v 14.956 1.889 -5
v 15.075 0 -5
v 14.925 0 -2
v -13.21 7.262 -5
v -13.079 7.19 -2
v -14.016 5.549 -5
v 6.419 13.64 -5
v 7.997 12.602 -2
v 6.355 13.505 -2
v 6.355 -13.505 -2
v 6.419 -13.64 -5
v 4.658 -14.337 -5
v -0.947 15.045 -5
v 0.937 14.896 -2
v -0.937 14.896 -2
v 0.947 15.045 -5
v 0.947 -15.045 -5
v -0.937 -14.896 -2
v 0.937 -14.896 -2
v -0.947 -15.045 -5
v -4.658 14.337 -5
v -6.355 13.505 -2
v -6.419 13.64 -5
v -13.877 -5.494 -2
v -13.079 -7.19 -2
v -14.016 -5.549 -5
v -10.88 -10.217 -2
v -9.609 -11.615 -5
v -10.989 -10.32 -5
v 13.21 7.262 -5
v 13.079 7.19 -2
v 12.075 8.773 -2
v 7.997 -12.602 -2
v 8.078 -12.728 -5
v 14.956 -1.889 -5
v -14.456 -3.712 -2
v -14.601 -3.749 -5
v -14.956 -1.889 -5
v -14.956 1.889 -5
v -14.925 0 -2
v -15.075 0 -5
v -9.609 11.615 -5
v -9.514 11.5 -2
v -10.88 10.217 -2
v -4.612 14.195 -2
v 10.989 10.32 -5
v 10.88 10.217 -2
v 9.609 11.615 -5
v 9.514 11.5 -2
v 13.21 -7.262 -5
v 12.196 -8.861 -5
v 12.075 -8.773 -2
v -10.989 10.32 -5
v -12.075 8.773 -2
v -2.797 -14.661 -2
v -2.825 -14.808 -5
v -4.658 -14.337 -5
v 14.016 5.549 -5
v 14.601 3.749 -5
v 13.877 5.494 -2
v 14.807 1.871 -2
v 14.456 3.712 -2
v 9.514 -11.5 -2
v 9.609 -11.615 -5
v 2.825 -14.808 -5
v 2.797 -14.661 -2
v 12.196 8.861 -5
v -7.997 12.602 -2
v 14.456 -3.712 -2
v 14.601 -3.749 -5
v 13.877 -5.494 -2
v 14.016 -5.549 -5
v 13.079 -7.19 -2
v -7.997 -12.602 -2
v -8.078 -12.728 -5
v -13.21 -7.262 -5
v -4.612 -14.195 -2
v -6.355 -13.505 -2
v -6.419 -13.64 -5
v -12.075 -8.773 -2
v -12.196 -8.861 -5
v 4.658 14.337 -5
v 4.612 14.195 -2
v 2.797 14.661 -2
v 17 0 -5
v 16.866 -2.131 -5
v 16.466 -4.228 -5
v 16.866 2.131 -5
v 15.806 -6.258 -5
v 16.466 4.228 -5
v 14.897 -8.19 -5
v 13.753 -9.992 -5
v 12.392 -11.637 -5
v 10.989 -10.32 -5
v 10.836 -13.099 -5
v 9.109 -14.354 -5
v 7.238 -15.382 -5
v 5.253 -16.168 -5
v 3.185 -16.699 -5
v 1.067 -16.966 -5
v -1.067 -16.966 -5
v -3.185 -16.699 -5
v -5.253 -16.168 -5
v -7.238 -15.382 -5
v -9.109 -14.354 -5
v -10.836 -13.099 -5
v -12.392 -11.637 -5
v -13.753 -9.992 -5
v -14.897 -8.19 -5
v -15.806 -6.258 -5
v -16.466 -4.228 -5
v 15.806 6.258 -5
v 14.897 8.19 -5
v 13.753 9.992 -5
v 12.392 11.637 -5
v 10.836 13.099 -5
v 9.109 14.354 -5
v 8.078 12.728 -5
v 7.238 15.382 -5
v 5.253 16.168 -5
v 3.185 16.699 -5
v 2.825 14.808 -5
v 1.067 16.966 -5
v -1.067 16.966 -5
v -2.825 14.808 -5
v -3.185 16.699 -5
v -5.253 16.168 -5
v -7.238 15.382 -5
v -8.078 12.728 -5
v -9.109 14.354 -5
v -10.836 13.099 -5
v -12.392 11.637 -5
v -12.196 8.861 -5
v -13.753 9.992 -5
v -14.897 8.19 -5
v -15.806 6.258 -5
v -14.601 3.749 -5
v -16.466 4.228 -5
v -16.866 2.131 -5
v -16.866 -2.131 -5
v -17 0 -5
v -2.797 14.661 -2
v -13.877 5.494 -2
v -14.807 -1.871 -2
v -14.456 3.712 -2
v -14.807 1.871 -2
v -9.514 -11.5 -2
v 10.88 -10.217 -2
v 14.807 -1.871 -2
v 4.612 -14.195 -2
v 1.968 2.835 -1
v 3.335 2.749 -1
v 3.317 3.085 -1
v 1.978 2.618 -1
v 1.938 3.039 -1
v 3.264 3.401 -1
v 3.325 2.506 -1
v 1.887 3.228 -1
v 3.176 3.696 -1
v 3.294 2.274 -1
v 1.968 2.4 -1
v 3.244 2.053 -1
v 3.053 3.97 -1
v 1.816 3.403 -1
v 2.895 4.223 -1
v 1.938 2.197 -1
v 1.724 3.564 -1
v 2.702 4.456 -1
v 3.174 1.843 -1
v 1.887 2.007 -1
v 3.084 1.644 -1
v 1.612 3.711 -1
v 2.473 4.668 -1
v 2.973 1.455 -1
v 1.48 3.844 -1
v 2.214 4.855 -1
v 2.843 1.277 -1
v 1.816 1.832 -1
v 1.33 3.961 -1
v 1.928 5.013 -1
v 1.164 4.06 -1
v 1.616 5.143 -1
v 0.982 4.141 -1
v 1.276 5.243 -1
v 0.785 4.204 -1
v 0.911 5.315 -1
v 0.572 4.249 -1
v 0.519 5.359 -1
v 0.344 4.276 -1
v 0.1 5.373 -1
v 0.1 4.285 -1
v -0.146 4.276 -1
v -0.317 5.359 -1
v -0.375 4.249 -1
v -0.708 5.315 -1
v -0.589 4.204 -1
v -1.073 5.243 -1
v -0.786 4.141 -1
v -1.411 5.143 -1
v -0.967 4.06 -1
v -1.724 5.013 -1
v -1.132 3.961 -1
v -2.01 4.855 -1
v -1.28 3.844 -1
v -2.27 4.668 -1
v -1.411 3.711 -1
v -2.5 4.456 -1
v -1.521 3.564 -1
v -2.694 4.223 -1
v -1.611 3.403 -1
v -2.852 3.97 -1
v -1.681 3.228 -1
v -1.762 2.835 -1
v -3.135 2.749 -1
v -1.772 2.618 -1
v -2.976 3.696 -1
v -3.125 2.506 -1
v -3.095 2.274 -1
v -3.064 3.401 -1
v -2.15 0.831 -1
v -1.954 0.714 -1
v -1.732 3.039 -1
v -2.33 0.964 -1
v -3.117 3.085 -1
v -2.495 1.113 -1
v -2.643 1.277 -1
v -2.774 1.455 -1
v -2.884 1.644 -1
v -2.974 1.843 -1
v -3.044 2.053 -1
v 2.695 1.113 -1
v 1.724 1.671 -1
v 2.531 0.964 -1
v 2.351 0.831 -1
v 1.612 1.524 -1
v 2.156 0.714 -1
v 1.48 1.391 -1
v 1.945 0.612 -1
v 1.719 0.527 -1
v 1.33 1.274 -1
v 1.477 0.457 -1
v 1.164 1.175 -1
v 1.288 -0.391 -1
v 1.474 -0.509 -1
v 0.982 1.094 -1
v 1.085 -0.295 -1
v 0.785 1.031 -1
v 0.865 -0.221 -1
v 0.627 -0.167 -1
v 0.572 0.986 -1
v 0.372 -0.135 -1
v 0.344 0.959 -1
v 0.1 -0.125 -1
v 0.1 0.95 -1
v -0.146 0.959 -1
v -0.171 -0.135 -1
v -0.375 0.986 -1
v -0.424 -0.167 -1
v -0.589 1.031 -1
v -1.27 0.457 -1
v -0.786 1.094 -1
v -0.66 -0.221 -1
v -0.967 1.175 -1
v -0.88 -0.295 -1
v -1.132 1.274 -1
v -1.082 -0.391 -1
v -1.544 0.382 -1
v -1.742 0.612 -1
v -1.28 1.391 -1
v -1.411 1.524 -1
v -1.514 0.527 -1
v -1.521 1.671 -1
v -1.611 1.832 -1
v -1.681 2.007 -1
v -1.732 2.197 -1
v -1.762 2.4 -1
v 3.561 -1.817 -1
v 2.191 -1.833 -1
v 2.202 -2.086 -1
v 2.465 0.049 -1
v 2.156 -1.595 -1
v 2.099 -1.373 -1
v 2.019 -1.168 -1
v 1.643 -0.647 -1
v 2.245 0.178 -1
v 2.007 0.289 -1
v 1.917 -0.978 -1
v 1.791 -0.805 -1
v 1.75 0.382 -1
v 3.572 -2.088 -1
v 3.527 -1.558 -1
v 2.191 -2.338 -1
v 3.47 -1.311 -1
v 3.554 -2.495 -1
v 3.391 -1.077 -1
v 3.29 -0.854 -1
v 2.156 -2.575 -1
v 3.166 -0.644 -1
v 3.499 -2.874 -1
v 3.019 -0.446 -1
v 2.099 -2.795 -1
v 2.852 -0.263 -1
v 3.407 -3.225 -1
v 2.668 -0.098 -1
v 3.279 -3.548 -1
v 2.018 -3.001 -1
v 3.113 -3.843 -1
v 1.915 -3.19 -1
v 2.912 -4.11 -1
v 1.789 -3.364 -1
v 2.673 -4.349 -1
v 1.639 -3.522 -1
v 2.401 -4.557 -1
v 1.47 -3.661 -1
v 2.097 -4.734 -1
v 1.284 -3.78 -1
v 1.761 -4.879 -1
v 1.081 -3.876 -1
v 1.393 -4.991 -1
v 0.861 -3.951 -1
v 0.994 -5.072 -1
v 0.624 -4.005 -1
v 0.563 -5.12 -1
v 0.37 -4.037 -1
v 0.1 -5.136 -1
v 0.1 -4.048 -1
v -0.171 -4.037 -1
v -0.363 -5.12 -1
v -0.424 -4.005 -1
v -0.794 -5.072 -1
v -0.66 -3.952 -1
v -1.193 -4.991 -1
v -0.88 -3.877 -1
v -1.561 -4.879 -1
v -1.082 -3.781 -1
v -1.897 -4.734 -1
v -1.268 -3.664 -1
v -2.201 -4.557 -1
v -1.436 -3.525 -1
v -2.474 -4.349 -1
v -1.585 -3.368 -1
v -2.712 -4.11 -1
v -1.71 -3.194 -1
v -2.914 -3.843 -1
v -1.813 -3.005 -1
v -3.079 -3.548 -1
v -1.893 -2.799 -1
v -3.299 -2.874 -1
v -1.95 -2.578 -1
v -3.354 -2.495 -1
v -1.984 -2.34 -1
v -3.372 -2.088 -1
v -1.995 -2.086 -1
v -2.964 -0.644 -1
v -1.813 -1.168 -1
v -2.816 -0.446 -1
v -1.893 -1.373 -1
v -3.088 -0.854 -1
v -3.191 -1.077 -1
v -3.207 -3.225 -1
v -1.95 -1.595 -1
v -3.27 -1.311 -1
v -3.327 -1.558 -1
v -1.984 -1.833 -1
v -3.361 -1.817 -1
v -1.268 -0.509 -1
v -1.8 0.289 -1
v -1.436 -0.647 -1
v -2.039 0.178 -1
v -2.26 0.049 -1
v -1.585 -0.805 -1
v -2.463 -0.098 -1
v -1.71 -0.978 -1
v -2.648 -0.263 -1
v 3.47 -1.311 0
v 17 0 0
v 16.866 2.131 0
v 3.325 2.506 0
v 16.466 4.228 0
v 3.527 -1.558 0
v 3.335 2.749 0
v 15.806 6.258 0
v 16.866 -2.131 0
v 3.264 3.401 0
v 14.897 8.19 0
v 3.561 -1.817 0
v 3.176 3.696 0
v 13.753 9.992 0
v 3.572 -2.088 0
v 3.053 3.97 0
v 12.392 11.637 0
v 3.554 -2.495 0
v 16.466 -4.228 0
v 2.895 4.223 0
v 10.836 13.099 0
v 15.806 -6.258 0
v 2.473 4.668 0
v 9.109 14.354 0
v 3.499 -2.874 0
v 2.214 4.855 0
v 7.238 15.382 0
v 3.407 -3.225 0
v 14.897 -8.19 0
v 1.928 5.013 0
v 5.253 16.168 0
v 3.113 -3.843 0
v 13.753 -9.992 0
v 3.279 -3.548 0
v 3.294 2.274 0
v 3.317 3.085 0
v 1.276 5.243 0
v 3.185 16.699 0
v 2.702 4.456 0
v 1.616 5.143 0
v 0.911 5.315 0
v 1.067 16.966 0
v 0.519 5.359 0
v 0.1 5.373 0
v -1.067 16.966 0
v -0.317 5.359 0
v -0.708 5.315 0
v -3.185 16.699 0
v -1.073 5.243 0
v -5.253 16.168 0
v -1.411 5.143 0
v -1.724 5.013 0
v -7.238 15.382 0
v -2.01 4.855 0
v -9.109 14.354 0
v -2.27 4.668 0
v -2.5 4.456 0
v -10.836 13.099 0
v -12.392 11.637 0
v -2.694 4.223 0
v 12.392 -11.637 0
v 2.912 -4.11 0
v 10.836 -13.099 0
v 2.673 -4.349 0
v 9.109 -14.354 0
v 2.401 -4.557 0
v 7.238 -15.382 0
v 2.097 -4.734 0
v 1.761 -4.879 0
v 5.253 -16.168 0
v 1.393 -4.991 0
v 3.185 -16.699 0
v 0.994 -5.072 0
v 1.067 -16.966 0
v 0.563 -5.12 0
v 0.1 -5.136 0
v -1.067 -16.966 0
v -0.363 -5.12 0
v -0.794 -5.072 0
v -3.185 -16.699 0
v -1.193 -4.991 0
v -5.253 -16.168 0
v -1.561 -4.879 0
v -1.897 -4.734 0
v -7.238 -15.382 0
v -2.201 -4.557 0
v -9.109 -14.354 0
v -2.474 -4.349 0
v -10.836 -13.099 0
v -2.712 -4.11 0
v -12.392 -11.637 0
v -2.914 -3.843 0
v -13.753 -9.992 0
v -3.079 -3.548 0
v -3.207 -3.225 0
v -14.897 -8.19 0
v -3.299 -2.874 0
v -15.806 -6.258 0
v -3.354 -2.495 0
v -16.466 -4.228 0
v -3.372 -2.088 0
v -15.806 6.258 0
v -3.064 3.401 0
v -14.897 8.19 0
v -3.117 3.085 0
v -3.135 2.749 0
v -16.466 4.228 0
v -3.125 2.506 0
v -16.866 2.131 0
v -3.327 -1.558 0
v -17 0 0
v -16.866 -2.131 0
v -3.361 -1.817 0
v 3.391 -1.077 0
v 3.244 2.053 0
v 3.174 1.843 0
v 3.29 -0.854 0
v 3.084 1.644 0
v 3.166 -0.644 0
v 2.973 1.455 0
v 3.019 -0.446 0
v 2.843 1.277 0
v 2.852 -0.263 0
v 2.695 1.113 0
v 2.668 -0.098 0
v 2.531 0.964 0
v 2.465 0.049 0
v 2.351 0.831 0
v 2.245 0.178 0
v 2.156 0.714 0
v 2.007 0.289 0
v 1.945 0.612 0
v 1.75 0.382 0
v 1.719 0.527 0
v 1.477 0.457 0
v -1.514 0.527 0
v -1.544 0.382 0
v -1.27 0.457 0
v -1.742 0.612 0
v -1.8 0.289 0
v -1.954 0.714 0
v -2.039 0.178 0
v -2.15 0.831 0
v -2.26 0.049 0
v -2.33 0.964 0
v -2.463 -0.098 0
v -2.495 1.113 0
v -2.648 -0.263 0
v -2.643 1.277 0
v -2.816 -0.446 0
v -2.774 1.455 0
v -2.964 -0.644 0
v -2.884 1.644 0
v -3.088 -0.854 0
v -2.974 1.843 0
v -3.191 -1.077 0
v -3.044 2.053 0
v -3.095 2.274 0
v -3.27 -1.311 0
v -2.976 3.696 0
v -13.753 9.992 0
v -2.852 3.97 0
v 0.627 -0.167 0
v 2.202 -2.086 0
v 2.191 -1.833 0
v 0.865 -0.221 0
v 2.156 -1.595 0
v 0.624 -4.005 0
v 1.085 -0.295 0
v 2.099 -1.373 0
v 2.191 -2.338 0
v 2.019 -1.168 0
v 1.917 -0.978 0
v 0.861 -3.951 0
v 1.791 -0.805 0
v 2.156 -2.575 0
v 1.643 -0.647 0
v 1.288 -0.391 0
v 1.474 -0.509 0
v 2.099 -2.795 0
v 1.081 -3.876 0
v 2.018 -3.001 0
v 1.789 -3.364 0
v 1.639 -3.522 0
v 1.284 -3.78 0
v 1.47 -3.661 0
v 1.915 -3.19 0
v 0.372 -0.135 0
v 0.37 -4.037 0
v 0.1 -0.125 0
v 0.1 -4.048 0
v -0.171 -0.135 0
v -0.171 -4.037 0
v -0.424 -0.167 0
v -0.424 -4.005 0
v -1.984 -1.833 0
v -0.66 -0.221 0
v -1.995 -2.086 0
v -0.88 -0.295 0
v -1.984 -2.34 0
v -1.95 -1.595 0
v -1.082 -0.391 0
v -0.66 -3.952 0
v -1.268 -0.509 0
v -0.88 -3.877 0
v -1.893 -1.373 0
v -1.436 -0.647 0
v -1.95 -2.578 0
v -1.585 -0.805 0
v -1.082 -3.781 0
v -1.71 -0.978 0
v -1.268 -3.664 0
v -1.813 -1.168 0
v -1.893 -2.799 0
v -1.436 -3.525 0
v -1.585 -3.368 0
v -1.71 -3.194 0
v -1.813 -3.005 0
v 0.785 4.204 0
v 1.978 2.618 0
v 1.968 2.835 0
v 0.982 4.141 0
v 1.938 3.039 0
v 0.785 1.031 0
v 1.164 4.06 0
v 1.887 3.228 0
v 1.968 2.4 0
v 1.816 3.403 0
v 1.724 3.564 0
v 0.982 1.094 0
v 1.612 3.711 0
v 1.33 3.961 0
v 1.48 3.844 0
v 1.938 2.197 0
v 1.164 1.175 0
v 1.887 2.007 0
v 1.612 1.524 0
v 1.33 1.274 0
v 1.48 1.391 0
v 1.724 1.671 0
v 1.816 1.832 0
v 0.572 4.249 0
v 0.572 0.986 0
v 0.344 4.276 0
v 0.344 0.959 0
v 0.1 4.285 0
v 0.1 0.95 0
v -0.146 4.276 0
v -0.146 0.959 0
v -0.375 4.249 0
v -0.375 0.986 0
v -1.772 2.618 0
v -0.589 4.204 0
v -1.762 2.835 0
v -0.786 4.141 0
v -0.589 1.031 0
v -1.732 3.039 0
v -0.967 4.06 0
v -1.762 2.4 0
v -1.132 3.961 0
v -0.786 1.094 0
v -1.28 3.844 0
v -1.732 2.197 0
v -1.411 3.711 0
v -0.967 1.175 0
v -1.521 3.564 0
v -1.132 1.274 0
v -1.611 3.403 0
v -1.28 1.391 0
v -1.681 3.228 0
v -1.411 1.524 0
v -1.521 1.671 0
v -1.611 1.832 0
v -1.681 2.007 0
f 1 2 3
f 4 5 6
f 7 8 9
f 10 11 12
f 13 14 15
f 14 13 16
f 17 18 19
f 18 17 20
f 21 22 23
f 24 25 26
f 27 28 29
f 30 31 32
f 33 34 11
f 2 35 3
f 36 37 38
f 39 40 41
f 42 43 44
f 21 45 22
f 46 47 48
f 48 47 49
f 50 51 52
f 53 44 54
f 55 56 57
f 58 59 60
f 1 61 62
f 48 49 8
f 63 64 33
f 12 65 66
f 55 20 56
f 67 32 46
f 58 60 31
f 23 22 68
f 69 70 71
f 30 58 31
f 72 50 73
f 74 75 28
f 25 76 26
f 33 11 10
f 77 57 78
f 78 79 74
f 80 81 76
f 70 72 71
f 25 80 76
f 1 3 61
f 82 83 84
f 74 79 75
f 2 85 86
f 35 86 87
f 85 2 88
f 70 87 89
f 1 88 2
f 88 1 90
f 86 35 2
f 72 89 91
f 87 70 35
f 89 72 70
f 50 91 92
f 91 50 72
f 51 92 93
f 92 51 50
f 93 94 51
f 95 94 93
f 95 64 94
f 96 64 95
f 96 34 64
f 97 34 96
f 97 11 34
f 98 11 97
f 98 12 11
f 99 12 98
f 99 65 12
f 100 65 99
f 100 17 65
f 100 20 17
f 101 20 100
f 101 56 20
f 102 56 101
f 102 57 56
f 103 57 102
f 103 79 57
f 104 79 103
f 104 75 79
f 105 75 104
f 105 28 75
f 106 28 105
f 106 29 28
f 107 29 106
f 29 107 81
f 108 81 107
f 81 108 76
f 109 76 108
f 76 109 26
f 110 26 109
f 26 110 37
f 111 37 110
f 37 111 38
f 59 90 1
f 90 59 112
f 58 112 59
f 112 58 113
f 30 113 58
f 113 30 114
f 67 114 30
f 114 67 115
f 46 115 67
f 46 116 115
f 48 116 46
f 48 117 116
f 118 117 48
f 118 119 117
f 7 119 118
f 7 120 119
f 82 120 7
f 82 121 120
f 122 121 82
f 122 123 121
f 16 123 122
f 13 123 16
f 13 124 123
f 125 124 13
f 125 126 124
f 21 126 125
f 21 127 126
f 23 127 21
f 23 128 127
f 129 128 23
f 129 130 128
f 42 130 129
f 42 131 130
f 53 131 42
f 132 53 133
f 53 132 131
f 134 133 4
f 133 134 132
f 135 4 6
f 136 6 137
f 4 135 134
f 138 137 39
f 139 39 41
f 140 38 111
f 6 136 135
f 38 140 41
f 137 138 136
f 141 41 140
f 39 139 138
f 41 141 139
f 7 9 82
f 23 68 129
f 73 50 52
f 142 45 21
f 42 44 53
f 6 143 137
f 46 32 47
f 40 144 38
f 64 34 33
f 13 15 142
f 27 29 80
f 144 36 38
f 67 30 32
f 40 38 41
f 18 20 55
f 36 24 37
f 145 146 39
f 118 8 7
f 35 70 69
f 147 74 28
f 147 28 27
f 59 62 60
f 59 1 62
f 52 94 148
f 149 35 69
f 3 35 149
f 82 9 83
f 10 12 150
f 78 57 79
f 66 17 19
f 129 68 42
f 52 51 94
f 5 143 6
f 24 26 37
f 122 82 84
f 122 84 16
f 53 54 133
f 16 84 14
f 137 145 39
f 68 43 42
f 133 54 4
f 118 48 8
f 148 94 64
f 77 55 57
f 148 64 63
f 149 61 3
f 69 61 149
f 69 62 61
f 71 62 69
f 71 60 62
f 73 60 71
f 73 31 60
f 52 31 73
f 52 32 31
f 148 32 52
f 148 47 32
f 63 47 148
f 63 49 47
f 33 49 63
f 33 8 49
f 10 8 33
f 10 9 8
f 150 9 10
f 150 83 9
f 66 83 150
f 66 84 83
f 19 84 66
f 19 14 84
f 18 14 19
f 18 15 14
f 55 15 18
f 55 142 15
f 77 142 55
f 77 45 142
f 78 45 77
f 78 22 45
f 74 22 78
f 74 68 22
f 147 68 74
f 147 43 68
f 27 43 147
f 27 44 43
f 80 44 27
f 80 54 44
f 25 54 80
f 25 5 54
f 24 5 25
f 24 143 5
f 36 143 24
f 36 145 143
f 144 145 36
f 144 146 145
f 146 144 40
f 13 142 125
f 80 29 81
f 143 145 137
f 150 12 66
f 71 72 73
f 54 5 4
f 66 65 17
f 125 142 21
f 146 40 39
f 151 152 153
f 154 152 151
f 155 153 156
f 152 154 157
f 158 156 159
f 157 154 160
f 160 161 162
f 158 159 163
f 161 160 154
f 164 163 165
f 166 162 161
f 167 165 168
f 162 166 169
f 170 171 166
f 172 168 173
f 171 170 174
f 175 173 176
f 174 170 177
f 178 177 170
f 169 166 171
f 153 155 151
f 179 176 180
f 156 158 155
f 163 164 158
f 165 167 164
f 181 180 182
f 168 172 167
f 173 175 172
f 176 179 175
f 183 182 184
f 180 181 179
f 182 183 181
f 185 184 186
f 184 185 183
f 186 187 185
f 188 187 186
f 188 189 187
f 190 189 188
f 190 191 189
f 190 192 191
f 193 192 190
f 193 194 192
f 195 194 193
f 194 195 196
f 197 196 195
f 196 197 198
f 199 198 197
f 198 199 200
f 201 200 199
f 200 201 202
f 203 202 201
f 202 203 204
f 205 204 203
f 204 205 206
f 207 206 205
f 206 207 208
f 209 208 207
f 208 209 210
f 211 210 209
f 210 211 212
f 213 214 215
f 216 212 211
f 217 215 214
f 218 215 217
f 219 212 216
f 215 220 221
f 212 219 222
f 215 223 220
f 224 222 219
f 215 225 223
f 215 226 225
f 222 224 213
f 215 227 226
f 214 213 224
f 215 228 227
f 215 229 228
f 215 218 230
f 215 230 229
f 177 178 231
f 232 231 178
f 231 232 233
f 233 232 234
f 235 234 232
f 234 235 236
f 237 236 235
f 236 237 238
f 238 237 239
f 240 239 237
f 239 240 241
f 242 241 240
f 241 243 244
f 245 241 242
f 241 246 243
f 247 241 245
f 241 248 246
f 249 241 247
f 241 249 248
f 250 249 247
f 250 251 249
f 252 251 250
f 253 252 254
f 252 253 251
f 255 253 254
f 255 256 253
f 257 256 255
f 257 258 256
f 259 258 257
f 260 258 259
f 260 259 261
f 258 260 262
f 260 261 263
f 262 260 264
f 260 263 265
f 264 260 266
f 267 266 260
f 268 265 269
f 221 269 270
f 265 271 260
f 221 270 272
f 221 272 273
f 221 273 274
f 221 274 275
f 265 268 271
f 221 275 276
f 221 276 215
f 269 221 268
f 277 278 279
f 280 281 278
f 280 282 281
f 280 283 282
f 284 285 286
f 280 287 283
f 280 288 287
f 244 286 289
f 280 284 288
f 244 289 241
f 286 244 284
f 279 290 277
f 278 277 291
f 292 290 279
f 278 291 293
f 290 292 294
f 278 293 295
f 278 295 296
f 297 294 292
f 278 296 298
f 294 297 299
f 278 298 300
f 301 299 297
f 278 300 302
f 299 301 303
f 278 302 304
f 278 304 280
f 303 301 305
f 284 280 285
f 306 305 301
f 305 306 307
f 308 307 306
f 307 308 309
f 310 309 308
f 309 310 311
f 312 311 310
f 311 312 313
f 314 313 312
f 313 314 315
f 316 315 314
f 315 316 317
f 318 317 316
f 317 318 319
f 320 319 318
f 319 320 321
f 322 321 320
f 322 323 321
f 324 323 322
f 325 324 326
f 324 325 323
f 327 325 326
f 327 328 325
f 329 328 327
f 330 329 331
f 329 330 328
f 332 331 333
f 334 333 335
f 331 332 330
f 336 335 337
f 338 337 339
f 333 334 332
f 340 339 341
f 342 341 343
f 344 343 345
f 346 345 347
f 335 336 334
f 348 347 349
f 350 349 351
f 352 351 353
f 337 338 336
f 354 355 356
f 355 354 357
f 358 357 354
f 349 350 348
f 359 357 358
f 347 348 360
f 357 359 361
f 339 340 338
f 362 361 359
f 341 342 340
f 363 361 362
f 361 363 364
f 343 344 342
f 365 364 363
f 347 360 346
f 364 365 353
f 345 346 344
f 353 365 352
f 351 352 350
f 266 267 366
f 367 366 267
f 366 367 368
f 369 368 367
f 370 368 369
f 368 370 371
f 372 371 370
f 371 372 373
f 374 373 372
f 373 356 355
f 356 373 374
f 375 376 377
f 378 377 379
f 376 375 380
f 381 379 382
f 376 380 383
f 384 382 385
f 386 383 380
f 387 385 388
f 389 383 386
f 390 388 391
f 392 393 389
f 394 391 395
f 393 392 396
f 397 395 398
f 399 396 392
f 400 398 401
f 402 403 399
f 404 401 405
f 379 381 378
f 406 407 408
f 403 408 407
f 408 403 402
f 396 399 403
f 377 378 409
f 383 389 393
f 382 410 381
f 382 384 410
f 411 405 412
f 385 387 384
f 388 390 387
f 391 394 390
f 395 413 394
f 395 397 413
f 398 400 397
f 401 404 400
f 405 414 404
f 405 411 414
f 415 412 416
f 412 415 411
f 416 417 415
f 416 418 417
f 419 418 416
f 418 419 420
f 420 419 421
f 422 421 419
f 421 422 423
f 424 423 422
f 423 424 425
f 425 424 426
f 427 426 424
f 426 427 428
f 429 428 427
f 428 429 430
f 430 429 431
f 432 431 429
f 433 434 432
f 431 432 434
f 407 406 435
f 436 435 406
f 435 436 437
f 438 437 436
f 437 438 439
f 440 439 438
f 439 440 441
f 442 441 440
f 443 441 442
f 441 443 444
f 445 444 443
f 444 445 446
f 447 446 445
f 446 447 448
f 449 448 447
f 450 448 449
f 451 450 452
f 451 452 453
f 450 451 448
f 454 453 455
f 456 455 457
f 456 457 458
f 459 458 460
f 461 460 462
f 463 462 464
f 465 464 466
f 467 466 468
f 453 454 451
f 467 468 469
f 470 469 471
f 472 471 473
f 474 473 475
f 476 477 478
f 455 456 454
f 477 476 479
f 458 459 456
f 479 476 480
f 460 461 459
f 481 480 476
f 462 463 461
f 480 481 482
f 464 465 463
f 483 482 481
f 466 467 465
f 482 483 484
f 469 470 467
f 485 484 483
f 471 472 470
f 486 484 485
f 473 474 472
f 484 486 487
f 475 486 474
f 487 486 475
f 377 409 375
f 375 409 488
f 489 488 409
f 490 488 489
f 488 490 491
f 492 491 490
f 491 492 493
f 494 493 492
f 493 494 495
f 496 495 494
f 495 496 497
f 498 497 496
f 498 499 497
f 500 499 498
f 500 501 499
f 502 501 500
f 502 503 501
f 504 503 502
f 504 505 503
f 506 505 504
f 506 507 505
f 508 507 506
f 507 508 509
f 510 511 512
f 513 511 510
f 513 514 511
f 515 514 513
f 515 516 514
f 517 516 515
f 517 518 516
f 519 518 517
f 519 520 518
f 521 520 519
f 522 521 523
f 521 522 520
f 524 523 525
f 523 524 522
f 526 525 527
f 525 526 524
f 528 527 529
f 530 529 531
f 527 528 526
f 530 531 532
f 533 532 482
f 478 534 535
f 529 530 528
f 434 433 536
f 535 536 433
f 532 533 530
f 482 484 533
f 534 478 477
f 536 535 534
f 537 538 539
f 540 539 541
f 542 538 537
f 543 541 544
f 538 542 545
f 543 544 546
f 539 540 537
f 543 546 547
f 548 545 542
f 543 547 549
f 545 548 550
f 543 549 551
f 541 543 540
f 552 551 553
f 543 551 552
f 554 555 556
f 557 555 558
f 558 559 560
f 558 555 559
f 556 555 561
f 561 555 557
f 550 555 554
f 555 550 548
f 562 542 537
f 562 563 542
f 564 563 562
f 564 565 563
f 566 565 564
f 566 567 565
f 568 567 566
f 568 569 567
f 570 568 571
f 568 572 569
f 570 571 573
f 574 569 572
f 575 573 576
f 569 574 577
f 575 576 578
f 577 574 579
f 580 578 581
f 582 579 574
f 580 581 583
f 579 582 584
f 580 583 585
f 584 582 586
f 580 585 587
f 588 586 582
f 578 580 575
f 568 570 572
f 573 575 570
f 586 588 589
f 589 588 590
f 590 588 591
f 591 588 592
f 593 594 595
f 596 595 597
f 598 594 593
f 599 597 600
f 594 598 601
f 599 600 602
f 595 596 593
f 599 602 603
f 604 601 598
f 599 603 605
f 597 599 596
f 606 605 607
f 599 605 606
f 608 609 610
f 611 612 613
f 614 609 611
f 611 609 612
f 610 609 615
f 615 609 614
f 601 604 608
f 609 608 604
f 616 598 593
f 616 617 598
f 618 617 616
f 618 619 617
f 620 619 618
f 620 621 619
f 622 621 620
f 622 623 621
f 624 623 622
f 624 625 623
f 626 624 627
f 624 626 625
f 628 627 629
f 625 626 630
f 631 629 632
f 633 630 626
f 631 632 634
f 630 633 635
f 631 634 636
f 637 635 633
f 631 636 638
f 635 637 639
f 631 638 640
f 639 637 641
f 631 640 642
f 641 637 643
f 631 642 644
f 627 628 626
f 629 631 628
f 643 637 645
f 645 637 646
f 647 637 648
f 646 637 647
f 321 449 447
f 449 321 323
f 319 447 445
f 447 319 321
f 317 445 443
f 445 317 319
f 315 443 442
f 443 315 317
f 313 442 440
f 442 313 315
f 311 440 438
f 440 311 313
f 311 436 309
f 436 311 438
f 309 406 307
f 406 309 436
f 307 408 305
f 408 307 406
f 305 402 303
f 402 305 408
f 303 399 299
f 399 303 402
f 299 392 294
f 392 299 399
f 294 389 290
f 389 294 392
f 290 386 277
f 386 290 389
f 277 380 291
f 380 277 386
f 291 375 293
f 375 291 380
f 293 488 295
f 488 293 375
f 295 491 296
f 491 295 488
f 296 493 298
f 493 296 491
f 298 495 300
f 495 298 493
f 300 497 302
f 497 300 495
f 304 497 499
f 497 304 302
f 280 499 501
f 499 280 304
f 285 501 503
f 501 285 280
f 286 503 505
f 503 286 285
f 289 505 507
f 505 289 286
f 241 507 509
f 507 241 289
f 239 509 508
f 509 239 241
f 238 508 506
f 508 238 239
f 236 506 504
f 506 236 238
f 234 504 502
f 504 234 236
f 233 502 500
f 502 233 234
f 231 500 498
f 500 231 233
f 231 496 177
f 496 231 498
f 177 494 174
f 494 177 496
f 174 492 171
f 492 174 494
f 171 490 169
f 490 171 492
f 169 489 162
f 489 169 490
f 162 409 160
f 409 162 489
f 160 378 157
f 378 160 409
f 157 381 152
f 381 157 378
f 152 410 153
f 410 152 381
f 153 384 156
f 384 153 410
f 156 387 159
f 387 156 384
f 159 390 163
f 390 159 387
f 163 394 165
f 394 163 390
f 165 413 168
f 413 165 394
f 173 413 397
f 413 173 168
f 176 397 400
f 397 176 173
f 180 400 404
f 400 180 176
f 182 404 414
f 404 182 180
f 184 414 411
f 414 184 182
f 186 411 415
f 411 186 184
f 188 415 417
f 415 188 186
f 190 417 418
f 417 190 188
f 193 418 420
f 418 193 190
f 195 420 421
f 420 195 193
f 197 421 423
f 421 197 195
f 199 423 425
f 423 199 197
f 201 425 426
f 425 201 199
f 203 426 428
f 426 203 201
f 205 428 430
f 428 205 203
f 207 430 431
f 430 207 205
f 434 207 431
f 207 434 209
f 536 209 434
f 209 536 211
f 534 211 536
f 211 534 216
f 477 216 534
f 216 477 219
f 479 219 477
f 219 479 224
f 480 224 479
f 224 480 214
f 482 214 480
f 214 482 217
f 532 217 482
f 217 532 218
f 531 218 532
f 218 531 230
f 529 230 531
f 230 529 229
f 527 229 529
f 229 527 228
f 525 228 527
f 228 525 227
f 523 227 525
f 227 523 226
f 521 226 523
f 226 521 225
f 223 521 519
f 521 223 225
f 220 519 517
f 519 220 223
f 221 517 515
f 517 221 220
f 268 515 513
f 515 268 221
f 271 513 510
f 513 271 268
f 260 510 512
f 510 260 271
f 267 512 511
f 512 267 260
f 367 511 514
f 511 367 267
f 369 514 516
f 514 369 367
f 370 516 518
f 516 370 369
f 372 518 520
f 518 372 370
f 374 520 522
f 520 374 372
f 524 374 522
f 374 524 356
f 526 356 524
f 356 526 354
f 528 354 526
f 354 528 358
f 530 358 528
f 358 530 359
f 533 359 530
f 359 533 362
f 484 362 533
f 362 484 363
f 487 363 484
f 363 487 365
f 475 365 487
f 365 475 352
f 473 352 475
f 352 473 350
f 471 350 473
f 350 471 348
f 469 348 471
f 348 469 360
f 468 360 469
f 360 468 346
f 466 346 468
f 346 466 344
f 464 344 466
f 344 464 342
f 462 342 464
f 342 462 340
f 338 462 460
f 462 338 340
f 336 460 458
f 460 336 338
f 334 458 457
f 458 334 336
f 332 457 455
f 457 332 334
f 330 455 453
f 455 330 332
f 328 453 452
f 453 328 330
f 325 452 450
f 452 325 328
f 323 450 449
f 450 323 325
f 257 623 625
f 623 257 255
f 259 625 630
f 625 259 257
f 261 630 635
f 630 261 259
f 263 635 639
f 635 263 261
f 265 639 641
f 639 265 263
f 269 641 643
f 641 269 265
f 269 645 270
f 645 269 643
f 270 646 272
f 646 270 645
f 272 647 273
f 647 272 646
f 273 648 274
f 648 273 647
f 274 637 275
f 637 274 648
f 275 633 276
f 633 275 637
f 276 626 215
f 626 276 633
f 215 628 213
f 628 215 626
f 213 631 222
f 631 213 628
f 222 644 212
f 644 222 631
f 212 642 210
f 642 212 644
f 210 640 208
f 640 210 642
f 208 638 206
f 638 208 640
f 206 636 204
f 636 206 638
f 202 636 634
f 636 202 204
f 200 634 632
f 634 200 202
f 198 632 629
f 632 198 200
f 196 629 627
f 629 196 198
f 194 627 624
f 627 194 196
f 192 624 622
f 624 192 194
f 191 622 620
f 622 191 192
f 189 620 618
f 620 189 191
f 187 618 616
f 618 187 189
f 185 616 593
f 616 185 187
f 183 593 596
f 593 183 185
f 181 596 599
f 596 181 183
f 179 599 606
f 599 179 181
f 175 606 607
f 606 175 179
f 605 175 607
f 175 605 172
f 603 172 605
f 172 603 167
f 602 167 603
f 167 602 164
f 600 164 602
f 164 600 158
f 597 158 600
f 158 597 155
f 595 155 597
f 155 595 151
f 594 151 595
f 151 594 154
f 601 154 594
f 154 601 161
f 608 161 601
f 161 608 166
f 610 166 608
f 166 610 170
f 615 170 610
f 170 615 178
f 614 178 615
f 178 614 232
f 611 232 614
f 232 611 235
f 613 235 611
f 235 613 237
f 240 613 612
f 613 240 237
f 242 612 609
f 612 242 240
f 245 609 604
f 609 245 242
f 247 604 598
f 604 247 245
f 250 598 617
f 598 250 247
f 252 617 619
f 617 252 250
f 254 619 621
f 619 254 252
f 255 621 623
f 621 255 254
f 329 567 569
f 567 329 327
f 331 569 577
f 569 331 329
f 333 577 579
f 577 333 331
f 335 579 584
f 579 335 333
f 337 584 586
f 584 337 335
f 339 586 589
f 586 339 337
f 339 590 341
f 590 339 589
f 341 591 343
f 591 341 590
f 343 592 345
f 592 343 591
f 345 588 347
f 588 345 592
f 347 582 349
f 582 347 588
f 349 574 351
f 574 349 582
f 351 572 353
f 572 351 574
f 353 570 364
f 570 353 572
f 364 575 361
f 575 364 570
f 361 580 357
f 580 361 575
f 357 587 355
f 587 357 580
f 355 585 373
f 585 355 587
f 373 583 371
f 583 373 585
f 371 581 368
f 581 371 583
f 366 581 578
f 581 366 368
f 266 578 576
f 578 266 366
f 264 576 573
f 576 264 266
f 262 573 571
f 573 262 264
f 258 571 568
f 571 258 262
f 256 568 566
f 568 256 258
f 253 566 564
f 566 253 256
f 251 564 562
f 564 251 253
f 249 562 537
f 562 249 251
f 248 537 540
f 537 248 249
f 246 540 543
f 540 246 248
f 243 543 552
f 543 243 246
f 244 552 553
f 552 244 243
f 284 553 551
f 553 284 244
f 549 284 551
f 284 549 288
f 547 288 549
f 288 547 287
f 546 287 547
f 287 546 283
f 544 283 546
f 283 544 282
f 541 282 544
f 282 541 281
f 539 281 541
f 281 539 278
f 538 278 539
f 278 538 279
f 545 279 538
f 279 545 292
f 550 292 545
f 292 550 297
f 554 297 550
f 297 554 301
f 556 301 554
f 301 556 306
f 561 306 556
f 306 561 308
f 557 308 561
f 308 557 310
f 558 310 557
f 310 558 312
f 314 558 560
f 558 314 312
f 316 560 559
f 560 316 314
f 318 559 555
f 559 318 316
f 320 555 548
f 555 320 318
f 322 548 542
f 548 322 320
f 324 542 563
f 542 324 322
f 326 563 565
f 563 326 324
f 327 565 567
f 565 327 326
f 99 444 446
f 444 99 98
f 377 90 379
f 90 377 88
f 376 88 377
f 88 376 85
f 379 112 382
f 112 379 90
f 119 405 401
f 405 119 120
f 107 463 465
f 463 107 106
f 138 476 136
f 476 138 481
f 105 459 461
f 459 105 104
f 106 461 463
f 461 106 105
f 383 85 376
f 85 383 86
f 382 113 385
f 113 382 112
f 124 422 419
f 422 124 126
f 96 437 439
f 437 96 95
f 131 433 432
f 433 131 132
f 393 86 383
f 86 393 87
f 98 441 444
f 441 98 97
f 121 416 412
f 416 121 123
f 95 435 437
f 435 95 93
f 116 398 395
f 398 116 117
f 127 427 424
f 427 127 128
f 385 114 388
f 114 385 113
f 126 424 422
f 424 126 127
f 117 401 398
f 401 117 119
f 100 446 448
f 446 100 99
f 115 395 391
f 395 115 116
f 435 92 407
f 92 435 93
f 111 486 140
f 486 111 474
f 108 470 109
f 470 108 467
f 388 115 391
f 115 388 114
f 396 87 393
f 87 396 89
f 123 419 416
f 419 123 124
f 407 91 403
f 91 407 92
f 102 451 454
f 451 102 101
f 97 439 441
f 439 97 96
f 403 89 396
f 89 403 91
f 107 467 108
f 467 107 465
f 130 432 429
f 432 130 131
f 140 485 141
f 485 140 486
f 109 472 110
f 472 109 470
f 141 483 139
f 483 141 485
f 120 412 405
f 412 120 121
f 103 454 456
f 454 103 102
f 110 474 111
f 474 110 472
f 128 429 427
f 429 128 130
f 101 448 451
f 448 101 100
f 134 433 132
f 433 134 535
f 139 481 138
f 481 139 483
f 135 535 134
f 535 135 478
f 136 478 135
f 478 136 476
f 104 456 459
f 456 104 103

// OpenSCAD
$fn = 50;

difference() {
	union() {
		translate(v = [0, 0, -5.0]) {
			cylinder(h = 5, r = 17.0);
		}
	}
	union() {
		#translate(v = [0, 0, -5.0]) {
			cylinder(h = 3, r1 = 15.075, r2 = 14.925);
		}
		translate(v = [0, 0, -1]) {
			linear_extrude(height = 1) {
				text(font = "Impact", halign = "center", size = 10, text = "8", valign = "center");
			}
		}
	}
}
